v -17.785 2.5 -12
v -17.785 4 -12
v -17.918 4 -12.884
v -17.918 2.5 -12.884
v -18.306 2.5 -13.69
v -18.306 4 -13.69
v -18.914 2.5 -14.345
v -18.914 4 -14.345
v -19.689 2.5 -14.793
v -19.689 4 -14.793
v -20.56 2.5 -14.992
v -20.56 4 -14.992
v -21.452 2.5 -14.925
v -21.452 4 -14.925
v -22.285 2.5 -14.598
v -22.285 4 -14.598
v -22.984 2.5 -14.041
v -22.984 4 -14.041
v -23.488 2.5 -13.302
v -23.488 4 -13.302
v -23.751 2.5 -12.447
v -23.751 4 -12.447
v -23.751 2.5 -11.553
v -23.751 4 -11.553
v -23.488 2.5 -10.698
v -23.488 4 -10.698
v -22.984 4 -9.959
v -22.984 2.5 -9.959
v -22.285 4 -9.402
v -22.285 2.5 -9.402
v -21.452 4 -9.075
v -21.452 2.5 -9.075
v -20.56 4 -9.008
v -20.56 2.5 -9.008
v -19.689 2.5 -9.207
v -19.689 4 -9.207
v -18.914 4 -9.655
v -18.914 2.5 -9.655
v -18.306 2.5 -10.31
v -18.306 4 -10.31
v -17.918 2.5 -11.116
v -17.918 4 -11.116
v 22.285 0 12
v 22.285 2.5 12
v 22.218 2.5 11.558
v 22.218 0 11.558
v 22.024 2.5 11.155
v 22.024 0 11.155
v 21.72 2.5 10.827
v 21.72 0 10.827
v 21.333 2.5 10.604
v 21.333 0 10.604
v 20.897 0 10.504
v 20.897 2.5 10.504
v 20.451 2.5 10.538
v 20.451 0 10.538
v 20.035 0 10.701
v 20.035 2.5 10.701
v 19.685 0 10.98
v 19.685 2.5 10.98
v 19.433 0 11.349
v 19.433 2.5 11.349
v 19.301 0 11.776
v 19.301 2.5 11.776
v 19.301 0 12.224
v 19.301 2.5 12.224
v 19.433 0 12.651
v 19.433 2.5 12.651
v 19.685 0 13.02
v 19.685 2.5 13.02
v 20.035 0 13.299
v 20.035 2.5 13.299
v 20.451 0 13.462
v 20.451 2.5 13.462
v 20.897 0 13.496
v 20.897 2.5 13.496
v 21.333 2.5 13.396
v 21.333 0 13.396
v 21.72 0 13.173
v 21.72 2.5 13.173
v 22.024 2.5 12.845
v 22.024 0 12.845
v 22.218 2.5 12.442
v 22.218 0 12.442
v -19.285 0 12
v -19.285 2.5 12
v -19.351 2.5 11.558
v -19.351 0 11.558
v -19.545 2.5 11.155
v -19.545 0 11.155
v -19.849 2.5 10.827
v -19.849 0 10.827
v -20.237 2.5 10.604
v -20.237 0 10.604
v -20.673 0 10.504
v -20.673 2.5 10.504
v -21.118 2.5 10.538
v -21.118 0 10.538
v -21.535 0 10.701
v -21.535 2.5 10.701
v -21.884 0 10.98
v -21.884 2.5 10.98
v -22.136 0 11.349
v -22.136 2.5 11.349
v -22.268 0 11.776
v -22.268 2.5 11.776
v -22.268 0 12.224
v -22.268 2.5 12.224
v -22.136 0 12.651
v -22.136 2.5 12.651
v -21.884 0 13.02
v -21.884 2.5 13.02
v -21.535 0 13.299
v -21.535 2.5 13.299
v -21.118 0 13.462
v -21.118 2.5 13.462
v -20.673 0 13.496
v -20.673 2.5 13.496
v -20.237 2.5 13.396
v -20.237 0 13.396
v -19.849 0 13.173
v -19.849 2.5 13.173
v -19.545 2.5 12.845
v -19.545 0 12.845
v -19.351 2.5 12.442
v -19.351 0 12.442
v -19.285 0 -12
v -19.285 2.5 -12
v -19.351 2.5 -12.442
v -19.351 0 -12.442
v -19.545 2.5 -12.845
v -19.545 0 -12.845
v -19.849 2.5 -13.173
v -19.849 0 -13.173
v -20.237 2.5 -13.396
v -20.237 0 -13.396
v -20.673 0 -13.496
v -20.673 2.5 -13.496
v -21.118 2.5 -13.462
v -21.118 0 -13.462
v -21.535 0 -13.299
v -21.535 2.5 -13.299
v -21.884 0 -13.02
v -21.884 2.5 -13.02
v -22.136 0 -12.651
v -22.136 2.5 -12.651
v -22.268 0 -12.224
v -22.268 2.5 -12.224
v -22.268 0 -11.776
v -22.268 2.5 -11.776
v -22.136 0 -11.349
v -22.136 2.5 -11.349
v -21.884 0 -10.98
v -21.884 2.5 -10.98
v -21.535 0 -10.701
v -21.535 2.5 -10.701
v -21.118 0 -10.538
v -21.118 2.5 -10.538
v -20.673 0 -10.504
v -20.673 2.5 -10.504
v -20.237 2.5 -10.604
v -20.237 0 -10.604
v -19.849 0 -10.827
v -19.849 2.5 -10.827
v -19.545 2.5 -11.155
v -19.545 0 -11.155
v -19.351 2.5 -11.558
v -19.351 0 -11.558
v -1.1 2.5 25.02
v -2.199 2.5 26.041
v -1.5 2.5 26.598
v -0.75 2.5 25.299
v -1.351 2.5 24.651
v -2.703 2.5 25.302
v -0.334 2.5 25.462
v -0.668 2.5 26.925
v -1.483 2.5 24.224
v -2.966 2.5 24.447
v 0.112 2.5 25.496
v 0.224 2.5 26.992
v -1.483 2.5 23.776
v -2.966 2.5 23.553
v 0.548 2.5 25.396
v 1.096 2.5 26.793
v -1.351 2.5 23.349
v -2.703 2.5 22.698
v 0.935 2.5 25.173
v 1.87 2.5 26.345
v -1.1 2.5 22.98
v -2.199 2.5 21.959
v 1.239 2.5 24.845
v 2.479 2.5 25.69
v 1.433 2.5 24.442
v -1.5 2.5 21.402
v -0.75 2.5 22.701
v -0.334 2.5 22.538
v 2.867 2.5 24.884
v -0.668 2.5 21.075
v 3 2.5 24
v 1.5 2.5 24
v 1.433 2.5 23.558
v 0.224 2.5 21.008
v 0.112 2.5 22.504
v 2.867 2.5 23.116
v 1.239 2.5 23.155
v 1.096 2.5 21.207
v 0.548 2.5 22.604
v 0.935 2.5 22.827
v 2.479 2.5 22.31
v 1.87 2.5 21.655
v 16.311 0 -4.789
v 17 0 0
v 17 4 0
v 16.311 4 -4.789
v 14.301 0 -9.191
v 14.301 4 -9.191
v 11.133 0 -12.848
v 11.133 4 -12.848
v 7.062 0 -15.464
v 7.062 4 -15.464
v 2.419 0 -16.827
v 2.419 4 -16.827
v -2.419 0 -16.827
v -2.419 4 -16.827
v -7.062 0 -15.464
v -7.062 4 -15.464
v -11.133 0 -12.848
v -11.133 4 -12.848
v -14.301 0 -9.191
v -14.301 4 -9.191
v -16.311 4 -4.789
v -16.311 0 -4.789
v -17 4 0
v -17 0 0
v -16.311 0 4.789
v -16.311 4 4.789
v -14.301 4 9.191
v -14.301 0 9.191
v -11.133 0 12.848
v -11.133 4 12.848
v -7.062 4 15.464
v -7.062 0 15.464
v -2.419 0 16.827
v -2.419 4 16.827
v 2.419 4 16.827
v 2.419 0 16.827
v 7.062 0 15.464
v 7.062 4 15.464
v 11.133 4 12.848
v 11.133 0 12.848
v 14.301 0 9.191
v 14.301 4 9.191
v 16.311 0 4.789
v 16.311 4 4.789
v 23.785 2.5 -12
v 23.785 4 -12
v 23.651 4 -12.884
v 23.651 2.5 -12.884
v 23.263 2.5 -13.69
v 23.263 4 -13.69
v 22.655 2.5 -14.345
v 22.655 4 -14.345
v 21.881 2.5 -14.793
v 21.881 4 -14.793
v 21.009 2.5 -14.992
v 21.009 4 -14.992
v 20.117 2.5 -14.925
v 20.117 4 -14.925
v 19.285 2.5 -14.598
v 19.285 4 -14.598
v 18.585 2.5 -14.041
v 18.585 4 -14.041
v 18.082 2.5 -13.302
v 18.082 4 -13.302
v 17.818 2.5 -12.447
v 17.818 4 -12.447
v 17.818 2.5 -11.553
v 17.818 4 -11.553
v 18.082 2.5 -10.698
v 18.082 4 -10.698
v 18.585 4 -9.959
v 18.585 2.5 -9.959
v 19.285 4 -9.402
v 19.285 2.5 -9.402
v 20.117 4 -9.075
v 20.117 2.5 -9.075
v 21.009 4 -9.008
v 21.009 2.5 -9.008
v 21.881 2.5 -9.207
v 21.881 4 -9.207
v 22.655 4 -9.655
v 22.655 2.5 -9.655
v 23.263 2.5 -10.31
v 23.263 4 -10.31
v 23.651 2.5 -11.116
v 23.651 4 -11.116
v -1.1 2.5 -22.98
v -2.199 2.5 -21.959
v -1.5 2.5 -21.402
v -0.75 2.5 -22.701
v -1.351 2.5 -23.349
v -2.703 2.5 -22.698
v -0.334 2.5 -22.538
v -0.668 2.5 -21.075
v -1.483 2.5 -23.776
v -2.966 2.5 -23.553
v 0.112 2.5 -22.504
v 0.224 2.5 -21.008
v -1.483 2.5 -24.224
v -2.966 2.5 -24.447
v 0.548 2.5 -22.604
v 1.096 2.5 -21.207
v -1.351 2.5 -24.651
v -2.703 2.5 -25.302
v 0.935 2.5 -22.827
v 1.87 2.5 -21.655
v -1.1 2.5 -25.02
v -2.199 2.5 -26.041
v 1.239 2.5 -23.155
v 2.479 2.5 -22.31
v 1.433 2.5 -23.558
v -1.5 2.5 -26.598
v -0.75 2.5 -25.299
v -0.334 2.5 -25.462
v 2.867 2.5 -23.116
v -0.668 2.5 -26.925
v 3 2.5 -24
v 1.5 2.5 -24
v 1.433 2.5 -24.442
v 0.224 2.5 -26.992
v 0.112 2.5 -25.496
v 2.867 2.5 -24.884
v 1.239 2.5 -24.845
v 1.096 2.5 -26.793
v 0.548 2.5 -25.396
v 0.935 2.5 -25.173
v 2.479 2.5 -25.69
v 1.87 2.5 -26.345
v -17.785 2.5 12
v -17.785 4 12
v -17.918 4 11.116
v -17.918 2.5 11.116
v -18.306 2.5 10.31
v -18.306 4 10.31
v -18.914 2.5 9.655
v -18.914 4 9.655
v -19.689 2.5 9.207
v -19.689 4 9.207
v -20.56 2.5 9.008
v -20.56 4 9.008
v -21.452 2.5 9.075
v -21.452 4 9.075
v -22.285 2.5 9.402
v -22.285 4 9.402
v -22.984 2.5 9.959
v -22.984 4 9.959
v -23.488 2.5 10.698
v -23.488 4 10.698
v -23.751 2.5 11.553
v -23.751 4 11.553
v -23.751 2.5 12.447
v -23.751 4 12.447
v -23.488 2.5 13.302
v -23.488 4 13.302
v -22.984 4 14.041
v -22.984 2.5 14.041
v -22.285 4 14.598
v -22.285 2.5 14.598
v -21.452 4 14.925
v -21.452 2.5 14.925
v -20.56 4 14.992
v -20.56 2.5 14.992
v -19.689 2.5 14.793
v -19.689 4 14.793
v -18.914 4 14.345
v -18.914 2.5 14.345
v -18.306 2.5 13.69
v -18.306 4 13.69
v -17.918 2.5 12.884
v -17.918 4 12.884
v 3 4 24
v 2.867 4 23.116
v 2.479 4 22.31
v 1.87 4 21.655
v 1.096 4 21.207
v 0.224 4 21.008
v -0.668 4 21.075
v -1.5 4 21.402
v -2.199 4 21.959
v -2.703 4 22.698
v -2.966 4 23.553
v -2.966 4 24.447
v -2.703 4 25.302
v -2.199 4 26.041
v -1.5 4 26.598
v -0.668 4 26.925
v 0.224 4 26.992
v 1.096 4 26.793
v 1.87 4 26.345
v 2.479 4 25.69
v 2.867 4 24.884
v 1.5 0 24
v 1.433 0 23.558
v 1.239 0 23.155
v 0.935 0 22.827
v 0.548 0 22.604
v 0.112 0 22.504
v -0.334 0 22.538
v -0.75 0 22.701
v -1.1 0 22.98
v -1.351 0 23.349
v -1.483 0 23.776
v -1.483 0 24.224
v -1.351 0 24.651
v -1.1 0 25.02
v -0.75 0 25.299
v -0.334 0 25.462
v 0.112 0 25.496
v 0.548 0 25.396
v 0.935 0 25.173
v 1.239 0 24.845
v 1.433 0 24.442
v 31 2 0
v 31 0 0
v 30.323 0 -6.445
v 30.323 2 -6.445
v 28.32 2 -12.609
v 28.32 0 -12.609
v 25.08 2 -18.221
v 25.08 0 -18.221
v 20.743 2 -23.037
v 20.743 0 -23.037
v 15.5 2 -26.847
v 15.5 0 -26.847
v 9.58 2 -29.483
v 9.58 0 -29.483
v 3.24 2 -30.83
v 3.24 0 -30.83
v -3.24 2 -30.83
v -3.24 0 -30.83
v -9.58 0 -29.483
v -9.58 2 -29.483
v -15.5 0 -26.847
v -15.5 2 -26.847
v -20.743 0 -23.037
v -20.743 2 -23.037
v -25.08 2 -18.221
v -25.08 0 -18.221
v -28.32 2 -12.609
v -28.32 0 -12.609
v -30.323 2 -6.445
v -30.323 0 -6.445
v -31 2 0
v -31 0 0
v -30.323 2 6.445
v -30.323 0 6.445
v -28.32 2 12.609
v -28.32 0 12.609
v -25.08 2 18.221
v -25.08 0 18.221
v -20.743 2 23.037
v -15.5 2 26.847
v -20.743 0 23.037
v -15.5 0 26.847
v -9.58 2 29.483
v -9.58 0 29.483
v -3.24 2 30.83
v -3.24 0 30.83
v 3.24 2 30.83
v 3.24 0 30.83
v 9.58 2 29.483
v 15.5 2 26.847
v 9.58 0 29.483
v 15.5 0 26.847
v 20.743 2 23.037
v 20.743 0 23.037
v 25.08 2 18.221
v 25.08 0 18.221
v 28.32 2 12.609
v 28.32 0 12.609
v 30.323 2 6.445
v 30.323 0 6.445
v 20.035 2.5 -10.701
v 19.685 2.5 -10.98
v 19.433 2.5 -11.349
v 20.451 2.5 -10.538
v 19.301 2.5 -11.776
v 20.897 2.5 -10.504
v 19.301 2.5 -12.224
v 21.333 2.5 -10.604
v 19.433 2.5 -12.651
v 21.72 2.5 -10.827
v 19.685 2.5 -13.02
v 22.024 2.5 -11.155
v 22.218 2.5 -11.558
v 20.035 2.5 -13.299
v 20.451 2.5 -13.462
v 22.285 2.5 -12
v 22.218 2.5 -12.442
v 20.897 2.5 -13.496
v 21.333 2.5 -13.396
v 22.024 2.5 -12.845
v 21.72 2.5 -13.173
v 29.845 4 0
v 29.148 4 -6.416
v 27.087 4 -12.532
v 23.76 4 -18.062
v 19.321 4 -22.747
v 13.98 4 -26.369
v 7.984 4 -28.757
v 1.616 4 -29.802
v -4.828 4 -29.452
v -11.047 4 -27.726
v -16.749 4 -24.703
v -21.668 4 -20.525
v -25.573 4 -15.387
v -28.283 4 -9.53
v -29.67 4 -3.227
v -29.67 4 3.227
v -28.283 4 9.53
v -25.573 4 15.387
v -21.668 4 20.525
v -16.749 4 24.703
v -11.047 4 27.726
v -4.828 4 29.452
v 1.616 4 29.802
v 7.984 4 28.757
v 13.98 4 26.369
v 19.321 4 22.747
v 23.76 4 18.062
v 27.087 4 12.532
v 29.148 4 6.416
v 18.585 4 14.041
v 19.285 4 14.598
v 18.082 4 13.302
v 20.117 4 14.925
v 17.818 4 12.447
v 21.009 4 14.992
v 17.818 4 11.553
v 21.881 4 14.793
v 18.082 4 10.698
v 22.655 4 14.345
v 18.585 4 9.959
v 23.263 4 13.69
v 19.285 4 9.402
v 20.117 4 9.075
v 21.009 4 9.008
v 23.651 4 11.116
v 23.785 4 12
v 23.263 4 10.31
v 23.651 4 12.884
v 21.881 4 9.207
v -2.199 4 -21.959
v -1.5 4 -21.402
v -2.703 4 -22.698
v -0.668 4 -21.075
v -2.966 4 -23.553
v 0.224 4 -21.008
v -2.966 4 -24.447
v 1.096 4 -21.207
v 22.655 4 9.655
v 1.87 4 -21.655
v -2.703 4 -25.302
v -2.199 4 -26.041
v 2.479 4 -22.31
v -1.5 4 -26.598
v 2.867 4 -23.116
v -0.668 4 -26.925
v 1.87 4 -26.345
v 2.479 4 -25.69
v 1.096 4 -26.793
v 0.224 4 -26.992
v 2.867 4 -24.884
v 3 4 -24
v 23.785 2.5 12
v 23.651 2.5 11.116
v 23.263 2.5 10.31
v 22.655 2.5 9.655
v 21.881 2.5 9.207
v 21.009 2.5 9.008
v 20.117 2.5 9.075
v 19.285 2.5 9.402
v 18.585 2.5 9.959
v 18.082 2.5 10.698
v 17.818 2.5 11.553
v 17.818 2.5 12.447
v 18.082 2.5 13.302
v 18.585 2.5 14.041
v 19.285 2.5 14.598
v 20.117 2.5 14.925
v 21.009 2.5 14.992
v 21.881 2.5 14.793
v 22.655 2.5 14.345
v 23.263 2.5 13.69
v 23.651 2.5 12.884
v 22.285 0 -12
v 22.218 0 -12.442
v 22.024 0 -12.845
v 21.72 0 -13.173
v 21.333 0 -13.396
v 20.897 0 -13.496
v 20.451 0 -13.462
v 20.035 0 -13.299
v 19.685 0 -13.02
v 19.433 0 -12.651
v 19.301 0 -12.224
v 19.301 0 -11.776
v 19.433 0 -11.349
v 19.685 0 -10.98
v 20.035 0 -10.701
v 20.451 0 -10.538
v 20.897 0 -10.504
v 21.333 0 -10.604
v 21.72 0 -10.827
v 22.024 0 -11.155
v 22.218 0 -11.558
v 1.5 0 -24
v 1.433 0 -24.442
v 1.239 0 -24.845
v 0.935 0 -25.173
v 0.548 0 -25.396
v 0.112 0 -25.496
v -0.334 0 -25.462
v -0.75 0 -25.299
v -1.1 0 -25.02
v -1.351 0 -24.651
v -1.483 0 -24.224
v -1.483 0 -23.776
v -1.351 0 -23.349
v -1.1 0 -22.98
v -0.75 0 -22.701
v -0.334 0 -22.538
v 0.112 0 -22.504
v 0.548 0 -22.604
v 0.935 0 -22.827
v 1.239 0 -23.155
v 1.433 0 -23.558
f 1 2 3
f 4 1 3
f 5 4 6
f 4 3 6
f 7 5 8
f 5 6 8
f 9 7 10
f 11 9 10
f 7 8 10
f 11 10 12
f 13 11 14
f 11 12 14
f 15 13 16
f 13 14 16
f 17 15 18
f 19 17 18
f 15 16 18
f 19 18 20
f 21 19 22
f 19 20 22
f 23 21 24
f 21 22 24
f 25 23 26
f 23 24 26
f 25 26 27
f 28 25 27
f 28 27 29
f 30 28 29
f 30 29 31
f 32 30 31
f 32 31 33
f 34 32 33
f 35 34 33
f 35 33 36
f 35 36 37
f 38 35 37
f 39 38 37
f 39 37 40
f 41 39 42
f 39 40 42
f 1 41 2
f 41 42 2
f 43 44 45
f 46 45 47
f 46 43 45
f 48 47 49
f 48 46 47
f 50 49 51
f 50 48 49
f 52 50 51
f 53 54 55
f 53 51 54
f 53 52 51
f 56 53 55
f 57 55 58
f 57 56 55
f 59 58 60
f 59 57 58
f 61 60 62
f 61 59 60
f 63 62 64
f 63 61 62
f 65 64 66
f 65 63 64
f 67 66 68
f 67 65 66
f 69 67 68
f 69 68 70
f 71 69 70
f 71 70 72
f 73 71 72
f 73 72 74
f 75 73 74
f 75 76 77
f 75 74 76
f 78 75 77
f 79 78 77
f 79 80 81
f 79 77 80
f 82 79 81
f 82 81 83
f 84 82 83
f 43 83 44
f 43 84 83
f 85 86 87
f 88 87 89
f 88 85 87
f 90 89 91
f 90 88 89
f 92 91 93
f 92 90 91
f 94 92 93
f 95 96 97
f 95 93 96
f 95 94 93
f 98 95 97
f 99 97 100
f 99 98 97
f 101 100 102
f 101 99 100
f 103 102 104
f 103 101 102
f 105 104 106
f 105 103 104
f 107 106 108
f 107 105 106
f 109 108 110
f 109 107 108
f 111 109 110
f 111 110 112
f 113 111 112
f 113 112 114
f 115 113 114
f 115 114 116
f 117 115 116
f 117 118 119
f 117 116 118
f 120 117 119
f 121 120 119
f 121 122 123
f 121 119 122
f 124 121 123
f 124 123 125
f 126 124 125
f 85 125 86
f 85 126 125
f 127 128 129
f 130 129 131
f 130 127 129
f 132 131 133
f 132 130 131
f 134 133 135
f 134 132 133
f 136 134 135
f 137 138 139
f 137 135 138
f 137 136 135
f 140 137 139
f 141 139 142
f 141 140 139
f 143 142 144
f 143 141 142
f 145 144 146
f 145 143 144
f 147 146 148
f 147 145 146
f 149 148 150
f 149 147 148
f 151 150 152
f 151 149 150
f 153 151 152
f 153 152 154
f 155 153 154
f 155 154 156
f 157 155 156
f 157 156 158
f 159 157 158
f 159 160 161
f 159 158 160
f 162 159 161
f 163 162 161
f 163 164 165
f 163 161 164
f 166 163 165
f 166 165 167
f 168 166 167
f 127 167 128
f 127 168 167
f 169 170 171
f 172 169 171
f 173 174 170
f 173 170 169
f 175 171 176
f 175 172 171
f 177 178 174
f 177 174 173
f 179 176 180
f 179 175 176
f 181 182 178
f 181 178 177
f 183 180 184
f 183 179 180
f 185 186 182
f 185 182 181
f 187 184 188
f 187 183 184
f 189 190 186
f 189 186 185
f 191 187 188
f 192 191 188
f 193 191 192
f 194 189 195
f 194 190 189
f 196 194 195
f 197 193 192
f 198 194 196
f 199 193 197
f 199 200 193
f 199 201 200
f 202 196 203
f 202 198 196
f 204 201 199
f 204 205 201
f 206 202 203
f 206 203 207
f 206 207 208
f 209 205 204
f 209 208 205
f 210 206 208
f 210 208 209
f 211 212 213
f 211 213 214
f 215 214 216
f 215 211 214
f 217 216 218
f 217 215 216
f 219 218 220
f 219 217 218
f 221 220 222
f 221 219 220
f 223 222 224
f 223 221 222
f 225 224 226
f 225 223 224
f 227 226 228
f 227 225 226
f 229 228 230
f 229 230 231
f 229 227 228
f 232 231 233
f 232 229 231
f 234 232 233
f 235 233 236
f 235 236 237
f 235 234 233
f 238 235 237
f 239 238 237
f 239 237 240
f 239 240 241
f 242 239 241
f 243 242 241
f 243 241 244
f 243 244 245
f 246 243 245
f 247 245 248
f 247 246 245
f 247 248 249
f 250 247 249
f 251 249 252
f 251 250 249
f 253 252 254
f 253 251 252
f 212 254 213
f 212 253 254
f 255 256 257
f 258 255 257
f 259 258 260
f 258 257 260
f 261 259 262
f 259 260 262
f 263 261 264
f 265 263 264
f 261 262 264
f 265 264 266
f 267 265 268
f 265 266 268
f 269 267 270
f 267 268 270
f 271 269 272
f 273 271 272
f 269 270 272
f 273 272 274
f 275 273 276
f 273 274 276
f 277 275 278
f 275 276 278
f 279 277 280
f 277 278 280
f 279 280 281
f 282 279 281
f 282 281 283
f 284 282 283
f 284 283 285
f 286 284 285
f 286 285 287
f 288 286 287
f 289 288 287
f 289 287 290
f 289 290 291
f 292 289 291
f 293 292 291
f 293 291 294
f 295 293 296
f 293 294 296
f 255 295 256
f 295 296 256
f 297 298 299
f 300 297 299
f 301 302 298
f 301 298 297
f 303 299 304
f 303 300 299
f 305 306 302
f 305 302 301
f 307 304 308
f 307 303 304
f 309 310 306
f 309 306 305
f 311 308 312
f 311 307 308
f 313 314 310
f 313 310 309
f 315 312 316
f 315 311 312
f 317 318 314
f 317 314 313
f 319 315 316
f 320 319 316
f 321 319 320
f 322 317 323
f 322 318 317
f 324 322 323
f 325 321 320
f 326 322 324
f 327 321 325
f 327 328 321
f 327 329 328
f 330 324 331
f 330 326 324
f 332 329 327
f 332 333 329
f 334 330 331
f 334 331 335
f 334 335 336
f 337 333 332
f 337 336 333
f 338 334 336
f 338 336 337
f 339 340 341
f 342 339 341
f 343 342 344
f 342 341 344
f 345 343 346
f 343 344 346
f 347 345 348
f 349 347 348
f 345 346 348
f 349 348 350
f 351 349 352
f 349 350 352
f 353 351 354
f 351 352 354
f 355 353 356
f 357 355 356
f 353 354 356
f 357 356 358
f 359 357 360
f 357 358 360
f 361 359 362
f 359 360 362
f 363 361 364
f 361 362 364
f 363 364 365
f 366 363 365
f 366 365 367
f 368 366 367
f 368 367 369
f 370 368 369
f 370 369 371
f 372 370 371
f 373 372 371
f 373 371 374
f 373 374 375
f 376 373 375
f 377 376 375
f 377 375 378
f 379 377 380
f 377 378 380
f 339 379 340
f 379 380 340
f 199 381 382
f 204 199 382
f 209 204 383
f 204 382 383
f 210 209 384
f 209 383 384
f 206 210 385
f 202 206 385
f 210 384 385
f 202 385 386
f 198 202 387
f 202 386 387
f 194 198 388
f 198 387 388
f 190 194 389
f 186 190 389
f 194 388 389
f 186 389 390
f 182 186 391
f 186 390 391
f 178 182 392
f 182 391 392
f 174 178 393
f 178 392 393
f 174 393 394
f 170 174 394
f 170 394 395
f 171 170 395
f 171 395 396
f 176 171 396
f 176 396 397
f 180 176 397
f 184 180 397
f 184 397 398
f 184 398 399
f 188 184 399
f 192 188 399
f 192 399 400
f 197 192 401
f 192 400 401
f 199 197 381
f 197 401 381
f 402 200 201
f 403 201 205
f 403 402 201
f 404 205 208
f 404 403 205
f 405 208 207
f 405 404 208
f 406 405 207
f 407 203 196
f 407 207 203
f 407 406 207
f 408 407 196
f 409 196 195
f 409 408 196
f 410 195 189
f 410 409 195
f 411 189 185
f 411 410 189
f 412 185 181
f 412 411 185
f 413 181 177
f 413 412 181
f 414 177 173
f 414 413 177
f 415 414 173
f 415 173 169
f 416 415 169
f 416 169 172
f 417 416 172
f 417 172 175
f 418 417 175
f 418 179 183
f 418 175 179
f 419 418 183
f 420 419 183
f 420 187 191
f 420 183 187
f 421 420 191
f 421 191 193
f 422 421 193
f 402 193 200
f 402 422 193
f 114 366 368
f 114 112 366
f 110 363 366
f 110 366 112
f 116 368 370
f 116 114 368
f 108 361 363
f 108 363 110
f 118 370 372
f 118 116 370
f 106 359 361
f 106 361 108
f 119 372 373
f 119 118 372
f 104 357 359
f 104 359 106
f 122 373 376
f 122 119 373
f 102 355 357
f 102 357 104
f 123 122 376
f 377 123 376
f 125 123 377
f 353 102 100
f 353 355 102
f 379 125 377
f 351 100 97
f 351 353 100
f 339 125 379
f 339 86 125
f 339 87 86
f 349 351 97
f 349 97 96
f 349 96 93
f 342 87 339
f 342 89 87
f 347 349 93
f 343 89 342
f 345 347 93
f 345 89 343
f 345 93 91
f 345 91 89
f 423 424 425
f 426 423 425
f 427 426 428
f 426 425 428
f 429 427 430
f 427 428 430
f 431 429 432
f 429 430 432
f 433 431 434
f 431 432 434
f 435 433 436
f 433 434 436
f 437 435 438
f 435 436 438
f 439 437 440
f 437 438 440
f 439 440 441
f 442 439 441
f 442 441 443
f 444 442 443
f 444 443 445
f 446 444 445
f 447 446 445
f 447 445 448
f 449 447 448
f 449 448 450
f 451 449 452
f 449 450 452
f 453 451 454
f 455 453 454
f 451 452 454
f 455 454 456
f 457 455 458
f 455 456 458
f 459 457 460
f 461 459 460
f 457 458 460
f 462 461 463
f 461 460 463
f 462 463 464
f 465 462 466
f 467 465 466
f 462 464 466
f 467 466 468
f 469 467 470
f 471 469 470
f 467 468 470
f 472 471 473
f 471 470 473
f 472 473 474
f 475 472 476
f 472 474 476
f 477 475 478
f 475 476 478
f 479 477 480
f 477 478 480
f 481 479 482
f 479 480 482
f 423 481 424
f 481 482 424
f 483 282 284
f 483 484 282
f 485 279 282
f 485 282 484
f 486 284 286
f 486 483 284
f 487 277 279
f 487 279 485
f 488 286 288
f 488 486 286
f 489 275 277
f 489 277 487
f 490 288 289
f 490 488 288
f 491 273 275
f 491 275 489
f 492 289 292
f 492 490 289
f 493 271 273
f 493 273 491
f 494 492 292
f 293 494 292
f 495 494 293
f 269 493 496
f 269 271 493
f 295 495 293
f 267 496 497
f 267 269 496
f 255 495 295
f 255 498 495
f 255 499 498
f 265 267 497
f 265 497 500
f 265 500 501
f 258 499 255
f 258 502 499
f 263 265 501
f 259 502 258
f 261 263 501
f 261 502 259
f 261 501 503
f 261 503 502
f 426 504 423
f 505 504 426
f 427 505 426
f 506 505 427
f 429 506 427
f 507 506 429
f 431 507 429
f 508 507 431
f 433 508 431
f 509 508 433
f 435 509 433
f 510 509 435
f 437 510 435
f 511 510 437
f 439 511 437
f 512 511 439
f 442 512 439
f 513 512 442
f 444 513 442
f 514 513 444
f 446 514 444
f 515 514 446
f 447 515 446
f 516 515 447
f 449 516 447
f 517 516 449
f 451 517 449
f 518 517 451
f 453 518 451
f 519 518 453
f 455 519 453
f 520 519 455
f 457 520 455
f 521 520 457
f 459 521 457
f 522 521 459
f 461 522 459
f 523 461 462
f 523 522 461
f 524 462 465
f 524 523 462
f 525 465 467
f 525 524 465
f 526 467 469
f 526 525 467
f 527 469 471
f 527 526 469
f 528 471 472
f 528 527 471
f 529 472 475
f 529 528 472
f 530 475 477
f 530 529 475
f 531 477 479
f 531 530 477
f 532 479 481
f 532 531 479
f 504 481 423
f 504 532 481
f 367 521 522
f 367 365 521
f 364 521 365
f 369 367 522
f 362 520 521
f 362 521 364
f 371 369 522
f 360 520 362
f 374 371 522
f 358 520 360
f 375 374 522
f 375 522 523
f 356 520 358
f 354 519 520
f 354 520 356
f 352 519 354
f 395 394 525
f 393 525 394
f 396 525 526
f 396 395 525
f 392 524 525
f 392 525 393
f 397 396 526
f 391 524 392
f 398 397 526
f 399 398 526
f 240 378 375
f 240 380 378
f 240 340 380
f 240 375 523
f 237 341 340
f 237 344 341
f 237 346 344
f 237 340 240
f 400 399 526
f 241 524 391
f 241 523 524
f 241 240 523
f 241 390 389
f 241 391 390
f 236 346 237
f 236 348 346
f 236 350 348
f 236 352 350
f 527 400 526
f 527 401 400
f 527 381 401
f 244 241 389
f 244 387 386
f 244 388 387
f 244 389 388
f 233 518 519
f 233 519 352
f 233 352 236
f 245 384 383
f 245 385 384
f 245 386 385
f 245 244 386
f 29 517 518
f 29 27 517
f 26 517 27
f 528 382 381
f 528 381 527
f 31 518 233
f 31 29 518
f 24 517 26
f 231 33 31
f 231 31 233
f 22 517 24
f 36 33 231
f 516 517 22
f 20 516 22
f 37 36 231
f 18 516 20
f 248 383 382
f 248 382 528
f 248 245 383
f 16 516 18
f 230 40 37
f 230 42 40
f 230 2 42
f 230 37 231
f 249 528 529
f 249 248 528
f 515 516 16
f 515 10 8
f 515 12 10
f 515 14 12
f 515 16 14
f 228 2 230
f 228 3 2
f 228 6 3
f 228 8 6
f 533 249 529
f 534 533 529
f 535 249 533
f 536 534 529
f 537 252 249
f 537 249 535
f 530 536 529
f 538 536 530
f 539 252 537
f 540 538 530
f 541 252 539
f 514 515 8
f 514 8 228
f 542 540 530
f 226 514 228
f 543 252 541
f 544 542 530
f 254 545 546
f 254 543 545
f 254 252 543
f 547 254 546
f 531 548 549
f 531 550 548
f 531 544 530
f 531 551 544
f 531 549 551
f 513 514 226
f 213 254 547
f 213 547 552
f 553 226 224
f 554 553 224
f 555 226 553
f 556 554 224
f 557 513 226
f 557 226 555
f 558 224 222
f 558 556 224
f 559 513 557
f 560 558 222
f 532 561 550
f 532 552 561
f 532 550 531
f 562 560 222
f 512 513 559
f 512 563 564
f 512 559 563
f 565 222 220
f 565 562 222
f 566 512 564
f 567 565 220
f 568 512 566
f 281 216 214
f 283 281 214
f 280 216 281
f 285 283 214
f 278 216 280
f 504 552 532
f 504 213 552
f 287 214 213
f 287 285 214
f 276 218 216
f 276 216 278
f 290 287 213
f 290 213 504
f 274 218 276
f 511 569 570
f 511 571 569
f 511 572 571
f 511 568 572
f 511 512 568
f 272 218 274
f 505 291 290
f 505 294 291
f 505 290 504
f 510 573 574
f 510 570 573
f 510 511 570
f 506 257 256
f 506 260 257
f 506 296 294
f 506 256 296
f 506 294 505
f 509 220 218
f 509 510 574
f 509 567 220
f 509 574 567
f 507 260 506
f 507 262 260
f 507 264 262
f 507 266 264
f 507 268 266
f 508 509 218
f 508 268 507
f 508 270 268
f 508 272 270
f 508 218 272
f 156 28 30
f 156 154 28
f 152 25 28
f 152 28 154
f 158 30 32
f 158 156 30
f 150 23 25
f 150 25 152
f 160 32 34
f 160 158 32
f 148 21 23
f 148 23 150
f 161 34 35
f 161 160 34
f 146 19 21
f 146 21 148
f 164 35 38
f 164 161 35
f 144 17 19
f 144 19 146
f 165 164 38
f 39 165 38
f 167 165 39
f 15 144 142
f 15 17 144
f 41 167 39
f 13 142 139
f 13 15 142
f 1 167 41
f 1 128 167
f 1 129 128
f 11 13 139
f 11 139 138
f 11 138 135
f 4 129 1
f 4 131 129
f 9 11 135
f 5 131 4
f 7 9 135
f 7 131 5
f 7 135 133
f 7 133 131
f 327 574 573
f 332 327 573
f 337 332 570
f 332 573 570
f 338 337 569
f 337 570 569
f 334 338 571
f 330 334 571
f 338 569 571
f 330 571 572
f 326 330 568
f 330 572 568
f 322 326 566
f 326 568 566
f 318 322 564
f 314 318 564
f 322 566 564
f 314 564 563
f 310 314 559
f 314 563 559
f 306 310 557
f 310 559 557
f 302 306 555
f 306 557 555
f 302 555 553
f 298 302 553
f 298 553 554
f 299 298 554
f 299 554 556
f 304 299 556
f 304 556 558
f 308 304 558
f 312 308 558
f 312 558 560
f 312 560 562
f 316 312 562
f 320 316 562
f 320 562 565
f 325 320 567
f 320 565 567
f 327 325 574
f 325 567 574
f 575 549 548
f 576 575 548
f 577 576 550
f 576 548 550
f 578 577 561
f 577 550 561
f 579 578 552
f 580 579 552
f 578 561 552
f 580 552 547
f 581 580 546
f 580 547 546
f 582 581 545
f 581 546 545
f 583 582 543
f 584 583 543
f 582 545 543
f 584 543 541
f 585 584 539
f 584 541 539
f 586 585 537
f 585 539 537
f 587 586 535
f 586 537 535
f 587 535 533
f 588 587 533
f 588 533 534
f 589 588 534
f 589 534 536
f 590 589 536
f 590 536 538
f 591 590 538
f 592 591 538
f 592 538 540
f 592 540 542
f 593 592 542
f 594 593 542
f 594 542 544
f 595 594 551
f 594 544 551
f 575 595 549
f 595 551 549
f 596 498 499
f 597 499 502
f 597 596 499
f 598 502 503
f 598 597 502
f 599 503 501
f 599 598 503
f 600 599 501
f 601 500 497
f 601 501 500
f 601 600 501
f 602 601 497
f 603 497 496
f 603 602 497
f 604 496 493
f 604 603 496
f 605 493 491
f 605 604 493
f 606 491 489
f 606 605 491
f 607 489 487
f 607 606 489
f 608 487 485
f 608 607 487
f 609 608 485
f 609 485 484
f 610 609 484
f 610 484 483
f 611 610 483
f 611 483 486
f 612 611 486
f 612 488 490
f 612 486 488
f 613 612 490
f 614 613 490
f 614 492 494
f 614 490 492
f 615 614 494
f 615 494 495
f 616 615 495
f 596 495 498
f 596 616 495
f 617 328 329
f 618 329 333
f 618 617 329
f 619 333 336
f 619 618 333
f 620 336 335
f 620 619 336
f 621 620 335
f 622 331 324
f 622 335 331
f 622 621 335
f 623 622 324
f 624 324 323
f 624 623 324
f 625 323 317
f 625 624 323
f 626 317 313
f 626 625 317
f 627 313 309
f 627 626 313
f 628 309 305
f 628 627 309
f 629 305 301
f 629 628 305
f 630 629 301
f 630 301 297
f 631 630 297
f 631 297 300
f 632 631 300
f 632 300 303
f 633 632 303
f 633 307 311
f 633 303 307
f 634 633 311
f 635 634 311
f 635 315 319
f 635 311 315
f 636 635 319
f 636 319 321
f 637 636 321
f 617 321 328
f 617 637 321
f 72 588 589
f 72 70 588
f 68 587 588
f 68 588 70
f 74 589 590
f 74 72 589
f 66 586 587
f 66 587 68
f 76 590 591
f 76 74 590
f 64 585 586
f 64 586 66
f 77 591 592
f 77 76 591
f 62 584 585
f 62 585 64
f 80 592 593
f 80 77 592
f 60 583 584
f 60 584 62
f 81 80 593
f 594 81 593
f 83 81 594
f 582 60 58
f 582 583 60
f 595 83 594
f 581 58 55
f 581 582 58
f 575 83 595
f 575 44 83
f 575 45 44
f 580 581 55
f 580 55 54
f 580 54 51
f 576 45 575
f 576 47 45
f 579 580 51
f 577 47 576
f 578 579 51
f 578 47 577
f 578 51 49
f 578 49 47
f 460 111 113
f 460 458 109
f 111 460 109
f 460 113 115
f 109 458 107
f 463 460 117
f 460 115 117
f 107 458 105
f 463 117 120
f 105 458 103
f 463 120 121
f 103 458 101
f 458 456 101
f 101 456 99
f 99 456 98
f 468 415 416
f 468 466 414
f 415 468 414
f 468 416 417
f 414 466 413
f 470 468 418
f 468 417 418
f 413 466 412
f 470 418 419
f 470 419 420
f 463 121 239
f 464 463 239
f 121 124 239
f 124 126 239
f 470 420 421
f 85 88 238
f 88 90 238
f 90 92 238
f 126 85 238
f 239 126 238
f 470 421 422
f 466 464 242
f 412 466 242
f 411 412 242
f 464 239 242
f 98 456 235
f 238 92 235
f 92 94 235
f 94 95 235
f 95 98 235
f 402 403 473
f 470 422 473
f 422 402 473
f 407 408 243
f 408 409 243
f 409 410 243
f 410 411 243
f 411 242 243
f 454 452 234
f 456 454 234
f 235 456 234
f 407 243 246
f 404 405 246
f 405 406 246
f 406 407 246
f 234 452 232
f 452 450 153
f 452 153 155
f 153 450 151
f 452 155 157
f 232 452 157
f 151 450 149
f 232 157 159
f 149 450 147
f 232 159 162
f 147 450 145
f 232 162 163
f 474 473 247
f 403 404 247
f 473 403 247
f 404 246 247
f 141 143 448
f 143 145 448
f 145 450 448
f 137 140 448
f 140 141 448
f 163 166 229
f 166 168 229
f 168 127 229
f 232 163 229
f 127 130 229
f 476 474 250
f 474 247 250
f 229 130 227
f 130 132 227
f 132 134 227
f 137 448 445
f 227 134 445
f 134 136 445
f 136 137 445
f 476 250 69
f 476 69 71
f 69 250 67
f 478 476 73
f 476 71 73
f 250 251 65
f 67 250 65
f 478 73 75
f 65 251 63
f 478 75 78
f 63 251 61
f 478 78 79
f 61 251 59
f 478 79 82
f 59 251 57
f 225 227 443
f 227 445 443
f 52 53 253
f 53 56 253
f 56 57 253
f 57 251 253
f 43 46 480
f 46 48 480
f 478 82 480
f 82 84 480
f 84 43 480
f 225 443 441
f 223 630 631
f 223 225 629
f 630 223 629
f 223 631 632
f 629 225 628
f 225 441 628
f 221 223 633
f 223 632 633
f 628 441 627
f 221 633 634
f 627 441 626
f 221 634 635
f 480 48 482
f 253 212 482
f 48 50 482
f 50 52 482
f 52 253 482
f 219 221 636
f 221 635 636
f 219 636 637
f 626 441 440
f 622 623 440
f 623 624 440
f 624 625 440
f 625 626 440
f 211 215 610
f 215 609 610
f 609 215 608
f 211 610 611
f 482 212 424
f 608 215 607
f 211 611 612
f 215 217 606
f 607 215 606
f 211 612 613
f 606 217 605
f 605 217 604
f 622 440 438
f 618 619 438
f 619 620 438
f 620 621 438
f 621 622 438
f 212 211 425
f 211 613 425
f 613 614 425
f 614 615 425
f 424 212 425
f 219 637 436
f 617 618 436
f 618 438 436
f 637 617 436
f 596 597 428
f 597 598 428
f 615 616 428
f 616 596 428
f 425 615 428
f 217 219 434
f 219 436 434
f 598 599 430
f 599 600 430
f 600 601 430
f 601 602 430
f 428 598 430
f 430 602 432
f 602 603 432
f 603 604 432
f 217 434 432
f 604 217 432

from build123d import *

# Parameters (mm, degrees)
SKETCH1_R           = 31
SKETCH1_R_2         = 17
SKETCH1_R_3         = 1.5
BOSS_EXTRUDE1_DEPTH = 4
SKETCH2_R           = 3
CUT_EXTRUDE1_DEPTH  = 1.5
CHAMFER1_SIZE       = 2
CHAMFER1_SIZE2      = 1.154700538


with BuildPart() as part:
    # Sketch1 → Boss-Extrude1 (new body)
    with BuildSketch(Plane(origin=(0, 0, 0), x_dir=(1, 0, 0), z_dir=(0, 1, 0))):
        Circle(SKETCH1_R)
        Circle(SKETCH1_R_2, mode=Mode.SUBTRACT)
        with Locations((0, 24)):
            Circle(SKETCH1_R_3, mode=Mode.SUBTRACT)
        with Locations((20.784609691, 12)):
            Circle(SKETCH1_R_3, mode=Mode.SUBTRACT)
        with Locations((20.784609691, -12)):
            Circle(SKETCH1_R_3, mode=Mode.SUBTRACT)
        with Locations((0, -24)):
            Circle(SKETCH1_R_3, mode=Mode.SUBTRACT)
        with Locations((-20.784609691, -12)):
            Circle(SKETCH1_R_3, mode=Mode.SUBTRACT)
        with Locations((-20.784609691, 12)):
            Circle(SKETCH1_R_3, mode=Mode.SUBTRACT)
    extrude(amount=BOSS_EXTRUDE1_DEPTH)

    # Sketch2 → Cut-Extrude1 (cut)
    with BuildSketch(Plane(origin=(0, 4, 0), x_dir=(1, 0, 0), z_dir=(0, 1, 0))):
        with Locations((0, 24)):
            Circle(SKETCH2_R)
        with Locations((20.784609691, 12)):
            Circle(SKETCH2_R)
        with Locations((20.784609691, -12)):
            Circle(SKETCH2_R)
        with Locations((0, -24)):
            Circle(SKETCH2_R)
        with Locations((-20.784609691, -12)):
            Circle(SKETCH2_R)
        with Locations((-20.784609691, 12)):
            Circle(SKETCH2_R)
    extrude(amount=-CUT_EXTRUDE1_DEPTH, mode=Mode.SUBTRACT)

    # Chamfer1
    chamfer1_edges = [part.edges().sort_by_distance(p)[0] for p in [
        (-31, 4, 0),
    ]]
    chamfer1_side = [part.faces().sort_by_distance(p)[0] for p in [
        (-31, 2, 0),
    ]]
    chamfer(chamfer1_edges, length=CHAMFER1_SIZE, length2=CHAMFER1_SIZE2, reference=chamfer1_side[0])


solid = part.part
